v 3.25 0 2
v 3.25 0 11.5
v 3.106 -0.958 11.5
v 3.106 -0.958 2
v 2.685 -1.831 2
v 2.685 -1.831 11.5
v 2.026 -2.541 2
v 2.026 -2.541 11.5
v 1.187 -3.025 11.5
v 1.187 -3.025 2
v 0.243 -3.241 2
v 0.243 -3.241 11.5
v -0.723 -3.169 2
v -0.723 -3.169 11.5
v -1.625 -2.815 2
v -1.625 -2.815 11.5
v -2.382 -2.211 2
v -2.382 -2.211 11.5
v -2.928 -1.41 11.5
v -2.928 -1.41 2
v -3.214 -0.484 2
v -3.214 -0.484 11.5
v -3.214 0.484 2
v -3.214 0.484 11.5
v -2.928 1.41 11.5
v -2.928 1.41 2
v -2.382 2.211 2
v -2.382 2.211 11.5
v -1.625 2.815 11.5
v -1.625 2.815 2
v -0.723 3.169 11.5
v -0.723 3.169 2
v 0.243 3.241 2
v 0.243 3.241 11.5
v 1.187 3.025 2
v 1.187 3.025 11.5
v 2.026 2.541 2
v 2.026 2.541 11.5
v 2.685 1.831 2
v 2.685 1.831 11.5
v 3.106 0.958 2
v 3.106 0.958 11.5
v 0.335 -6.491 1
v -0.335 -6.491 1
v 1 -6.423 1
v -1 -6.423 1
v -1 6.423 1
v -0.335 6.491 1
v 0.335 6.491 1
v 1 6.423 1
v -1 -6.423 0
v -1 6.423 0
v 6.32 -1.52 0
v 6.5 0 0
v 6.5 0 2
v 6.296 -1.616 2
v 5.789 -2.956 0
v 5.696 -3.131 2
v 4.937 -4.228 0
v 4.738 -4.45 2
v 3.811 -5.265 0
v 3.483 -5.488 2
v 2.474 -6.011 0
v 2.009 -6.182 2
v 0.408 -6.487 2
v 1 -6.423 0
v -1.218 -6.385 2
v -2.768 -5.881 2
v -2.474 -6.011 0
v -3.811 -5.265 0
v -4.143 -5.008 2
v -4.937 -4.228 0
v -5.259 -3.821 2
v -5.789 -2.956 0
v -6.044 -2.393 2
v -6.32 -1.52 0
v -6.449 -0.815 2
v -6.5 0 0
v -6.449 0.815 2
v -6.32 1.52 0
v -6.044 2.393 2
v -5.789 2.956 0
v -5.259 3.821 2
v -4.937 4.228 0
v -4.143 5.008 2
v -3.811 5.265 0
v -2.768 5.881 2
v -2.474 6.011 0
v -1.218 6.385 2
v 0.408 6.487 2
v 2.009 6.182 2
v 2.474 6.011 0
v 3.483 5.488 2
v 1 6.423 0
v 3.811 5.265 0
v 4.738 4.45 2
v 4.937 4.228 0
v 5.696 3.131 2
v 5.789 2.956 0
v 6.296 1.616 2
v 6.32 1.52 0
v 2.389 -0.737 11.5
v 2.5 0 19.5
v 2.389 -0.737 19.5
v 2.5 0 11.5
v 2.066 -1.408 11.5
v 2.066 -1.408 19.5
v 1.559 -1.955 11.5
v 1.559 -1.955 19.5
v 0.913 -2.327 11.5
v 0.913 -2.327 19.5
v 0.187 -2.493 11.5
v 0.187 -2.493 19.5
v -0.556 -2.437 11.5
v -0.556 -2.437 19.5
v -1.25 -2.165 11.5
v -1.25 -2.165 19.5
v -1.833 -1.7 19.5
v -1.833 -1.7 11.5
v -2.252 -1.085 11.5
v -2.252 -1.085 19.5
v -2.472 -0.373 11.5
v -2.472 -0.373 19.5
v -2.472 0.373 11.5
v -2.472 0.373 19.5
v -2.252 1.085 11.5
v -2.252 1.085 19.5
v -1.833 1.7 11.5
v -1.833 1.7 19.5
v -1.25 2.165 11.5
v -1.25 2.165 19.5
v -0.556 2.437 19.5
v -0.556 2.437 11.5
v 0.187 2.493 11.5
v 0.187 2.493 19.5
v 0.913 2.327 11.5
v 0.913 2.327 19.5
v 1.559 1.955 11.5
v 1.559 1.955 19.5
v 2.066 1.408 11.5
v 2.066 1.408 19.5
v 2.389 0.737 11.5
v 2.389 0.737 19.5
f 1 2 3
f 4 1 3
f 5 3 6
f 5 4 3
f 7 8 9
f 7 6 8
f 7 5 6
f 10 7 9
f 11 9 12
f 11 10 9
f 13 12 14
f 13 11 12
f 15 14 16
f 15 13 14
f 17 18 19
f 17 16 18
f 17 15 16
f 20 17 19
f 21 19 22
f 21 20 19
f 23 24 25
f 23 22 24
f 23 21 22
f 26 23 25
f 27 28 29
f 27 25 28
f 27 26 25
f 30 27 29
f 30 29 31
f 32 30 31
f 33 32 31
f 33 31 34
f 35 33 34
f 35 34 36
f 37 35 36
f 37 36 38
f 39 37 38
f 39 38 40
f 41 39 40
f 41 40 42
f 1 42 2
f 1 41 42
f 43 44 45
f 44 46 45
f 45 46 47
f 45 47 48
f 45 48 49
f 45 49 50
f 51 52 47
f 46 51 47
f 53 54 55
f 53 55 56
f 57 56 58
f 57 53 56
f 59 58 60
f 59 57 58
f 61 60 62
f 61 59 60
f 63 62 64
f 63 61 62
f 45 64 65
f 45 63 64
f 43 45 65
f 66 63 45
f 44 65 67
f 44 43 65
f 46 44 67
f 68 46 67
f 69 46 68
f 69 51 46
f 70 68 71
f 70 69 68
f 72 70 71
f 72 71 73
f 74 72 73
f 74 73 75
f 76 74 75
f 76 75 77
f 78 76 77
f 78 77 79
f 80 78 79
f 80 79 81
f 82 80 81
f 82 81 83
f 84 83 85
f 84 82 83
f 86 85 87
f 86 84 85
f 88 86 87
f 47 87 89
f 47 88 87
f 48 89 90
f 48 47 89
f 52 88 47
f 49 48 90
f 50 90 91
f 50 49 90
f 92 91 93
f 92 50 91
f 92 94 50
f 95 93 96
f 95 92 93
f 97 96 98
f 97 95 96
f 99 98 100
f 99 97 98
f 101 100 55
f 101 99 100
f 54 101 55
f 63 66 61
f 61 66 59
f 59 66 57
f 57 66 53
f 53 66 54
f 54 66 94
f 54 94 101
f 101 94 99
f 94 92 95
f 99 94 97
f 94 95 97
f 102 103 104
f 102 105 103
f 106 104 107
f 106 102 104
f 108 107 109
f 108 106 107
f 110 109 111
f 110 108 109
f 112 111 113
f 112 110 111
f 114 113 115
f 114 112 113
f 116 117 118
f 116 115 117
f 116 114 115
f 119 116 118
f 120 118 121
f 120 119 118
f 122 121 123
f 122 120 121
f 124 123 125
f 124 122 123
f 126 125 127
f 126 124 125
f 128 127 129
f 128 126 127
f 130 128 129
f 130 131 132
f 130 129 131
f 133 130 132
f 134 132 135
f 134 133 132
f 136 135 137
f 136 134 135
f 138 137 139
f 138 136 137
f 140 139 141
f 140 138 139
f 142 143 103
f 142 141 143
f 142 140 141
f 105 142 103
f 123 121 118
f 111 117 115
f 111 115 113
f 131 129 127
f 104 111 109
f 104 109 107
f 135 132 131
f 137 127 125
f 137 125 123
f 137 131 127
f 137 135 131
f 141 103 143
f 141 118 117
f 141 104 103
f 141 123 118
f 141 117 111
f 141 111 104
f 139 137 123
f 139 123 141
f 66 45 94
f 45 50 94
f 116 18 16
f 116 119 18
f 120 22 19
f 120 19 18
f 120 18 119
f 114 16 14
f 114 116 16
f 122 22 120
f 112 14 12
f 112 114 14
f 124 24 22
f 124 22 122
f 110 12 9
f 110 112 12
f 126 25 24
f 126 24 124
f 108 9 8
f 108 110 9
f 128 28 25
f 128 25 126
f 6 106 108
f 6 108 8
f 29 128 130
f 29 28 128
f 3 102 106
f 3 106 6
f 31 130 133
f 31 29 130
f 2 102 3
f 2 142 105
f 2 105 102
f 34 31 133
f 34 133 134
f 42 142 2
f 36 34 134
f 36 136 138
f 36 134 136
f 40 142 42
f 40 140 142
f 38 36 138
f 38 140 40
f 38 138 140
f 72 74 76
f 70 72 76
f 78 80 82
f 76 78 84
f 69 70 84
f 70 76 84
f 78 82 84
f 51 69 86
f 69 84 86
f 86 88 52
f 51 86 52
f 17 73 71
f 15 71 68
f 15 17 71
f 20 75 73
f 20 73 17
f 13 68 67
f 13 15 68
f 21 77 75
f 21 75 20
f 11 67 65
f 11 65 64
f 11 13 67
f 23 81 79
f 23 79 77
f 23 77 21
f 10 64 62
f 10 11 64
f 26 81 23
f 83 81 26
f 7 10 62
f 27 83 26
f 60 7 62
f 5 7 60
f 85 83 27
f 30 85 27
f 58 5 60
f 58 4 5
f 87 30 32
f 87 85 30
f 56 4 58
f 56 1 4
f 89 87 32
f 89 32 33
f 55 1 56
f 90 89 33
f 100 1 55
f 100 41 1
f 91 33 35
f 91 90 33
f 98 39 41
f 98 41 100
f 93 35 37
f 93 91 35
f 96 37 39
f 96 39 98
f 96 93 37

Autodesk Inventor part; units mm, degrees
ref_plane "YZ Plane" through (0, 0, 0) normal (1, 0, 0) x (0, 1, 0)
ref_plane "XY Plane" through (0, 0, 0) normal (0, 0, 1) x (1, 0, 0)
sketch "Sketch1" plane through (0, 0, 0) normal (0, 0, 1) x (1, 0, 0)
  circle A0 centre (0, 0) radius 6.5
  dimension "d0" = 13
extrude "Extrusion1" add sketch "Sketch1" along normal blind 2
sketch "Sketch2" plane through (0, 0, 2) normal (0, 0, 1) x (1, 0, 0)
  circle A0 centre (0, 0) radius 6.5 projected
  circle A1 centre (0, 0) radius 3.25
  dimension "d3" = 6.5
extrude "Extrusion2" add sketch "Sketch2" along normal blind 9.5 contours A1
ref_plane "Work Plane1" through (0, 6.5, 0) normal (0, 1, 0) x (-1, 0, 0)
sketch "Sketch3" plane through (0, 6.5, 0) normal (0, 1, 0) x (-1, 0, 0)
  line L0 (6.5, 0) -> (-6.5, 0) projected
  line L1 (-1, 0) -> (1, 0)
  line L2 (1, 0) -> (1, 1)
  line L3 (1, 1) -> (-1, 1)
  line L4 (-1, 1) -> (-1, 0)
  point P0 (0, 0)
  point P1 (1, 0.5)
  point P2 (0, 0)
  dimension "d7" = 2
  dimension "d8" = 1
  dimension "d9" = 1
extrude "Extrusion3" cut sketch "Sketch3" against normal through all
sketch "Sketch4" plane through (0, 0, 11.5) normal (0, 0, 1) x (1, 0, 0)
  circle A0 centre (0, 0) radius 3.25 projected
  circle A1 centre (0, 0) radius 2.5
  dimension "d12" = 5
extrude "Extrusion4" add sketch "Sketch4" along normal blind 8 contours A1
thread "Thread1" size "M5x0.8" class "6g" standard "ANSI Metric M Profile" length 8
properties part number "Crankpin" material "Steel AISI 1020 107 HR"
